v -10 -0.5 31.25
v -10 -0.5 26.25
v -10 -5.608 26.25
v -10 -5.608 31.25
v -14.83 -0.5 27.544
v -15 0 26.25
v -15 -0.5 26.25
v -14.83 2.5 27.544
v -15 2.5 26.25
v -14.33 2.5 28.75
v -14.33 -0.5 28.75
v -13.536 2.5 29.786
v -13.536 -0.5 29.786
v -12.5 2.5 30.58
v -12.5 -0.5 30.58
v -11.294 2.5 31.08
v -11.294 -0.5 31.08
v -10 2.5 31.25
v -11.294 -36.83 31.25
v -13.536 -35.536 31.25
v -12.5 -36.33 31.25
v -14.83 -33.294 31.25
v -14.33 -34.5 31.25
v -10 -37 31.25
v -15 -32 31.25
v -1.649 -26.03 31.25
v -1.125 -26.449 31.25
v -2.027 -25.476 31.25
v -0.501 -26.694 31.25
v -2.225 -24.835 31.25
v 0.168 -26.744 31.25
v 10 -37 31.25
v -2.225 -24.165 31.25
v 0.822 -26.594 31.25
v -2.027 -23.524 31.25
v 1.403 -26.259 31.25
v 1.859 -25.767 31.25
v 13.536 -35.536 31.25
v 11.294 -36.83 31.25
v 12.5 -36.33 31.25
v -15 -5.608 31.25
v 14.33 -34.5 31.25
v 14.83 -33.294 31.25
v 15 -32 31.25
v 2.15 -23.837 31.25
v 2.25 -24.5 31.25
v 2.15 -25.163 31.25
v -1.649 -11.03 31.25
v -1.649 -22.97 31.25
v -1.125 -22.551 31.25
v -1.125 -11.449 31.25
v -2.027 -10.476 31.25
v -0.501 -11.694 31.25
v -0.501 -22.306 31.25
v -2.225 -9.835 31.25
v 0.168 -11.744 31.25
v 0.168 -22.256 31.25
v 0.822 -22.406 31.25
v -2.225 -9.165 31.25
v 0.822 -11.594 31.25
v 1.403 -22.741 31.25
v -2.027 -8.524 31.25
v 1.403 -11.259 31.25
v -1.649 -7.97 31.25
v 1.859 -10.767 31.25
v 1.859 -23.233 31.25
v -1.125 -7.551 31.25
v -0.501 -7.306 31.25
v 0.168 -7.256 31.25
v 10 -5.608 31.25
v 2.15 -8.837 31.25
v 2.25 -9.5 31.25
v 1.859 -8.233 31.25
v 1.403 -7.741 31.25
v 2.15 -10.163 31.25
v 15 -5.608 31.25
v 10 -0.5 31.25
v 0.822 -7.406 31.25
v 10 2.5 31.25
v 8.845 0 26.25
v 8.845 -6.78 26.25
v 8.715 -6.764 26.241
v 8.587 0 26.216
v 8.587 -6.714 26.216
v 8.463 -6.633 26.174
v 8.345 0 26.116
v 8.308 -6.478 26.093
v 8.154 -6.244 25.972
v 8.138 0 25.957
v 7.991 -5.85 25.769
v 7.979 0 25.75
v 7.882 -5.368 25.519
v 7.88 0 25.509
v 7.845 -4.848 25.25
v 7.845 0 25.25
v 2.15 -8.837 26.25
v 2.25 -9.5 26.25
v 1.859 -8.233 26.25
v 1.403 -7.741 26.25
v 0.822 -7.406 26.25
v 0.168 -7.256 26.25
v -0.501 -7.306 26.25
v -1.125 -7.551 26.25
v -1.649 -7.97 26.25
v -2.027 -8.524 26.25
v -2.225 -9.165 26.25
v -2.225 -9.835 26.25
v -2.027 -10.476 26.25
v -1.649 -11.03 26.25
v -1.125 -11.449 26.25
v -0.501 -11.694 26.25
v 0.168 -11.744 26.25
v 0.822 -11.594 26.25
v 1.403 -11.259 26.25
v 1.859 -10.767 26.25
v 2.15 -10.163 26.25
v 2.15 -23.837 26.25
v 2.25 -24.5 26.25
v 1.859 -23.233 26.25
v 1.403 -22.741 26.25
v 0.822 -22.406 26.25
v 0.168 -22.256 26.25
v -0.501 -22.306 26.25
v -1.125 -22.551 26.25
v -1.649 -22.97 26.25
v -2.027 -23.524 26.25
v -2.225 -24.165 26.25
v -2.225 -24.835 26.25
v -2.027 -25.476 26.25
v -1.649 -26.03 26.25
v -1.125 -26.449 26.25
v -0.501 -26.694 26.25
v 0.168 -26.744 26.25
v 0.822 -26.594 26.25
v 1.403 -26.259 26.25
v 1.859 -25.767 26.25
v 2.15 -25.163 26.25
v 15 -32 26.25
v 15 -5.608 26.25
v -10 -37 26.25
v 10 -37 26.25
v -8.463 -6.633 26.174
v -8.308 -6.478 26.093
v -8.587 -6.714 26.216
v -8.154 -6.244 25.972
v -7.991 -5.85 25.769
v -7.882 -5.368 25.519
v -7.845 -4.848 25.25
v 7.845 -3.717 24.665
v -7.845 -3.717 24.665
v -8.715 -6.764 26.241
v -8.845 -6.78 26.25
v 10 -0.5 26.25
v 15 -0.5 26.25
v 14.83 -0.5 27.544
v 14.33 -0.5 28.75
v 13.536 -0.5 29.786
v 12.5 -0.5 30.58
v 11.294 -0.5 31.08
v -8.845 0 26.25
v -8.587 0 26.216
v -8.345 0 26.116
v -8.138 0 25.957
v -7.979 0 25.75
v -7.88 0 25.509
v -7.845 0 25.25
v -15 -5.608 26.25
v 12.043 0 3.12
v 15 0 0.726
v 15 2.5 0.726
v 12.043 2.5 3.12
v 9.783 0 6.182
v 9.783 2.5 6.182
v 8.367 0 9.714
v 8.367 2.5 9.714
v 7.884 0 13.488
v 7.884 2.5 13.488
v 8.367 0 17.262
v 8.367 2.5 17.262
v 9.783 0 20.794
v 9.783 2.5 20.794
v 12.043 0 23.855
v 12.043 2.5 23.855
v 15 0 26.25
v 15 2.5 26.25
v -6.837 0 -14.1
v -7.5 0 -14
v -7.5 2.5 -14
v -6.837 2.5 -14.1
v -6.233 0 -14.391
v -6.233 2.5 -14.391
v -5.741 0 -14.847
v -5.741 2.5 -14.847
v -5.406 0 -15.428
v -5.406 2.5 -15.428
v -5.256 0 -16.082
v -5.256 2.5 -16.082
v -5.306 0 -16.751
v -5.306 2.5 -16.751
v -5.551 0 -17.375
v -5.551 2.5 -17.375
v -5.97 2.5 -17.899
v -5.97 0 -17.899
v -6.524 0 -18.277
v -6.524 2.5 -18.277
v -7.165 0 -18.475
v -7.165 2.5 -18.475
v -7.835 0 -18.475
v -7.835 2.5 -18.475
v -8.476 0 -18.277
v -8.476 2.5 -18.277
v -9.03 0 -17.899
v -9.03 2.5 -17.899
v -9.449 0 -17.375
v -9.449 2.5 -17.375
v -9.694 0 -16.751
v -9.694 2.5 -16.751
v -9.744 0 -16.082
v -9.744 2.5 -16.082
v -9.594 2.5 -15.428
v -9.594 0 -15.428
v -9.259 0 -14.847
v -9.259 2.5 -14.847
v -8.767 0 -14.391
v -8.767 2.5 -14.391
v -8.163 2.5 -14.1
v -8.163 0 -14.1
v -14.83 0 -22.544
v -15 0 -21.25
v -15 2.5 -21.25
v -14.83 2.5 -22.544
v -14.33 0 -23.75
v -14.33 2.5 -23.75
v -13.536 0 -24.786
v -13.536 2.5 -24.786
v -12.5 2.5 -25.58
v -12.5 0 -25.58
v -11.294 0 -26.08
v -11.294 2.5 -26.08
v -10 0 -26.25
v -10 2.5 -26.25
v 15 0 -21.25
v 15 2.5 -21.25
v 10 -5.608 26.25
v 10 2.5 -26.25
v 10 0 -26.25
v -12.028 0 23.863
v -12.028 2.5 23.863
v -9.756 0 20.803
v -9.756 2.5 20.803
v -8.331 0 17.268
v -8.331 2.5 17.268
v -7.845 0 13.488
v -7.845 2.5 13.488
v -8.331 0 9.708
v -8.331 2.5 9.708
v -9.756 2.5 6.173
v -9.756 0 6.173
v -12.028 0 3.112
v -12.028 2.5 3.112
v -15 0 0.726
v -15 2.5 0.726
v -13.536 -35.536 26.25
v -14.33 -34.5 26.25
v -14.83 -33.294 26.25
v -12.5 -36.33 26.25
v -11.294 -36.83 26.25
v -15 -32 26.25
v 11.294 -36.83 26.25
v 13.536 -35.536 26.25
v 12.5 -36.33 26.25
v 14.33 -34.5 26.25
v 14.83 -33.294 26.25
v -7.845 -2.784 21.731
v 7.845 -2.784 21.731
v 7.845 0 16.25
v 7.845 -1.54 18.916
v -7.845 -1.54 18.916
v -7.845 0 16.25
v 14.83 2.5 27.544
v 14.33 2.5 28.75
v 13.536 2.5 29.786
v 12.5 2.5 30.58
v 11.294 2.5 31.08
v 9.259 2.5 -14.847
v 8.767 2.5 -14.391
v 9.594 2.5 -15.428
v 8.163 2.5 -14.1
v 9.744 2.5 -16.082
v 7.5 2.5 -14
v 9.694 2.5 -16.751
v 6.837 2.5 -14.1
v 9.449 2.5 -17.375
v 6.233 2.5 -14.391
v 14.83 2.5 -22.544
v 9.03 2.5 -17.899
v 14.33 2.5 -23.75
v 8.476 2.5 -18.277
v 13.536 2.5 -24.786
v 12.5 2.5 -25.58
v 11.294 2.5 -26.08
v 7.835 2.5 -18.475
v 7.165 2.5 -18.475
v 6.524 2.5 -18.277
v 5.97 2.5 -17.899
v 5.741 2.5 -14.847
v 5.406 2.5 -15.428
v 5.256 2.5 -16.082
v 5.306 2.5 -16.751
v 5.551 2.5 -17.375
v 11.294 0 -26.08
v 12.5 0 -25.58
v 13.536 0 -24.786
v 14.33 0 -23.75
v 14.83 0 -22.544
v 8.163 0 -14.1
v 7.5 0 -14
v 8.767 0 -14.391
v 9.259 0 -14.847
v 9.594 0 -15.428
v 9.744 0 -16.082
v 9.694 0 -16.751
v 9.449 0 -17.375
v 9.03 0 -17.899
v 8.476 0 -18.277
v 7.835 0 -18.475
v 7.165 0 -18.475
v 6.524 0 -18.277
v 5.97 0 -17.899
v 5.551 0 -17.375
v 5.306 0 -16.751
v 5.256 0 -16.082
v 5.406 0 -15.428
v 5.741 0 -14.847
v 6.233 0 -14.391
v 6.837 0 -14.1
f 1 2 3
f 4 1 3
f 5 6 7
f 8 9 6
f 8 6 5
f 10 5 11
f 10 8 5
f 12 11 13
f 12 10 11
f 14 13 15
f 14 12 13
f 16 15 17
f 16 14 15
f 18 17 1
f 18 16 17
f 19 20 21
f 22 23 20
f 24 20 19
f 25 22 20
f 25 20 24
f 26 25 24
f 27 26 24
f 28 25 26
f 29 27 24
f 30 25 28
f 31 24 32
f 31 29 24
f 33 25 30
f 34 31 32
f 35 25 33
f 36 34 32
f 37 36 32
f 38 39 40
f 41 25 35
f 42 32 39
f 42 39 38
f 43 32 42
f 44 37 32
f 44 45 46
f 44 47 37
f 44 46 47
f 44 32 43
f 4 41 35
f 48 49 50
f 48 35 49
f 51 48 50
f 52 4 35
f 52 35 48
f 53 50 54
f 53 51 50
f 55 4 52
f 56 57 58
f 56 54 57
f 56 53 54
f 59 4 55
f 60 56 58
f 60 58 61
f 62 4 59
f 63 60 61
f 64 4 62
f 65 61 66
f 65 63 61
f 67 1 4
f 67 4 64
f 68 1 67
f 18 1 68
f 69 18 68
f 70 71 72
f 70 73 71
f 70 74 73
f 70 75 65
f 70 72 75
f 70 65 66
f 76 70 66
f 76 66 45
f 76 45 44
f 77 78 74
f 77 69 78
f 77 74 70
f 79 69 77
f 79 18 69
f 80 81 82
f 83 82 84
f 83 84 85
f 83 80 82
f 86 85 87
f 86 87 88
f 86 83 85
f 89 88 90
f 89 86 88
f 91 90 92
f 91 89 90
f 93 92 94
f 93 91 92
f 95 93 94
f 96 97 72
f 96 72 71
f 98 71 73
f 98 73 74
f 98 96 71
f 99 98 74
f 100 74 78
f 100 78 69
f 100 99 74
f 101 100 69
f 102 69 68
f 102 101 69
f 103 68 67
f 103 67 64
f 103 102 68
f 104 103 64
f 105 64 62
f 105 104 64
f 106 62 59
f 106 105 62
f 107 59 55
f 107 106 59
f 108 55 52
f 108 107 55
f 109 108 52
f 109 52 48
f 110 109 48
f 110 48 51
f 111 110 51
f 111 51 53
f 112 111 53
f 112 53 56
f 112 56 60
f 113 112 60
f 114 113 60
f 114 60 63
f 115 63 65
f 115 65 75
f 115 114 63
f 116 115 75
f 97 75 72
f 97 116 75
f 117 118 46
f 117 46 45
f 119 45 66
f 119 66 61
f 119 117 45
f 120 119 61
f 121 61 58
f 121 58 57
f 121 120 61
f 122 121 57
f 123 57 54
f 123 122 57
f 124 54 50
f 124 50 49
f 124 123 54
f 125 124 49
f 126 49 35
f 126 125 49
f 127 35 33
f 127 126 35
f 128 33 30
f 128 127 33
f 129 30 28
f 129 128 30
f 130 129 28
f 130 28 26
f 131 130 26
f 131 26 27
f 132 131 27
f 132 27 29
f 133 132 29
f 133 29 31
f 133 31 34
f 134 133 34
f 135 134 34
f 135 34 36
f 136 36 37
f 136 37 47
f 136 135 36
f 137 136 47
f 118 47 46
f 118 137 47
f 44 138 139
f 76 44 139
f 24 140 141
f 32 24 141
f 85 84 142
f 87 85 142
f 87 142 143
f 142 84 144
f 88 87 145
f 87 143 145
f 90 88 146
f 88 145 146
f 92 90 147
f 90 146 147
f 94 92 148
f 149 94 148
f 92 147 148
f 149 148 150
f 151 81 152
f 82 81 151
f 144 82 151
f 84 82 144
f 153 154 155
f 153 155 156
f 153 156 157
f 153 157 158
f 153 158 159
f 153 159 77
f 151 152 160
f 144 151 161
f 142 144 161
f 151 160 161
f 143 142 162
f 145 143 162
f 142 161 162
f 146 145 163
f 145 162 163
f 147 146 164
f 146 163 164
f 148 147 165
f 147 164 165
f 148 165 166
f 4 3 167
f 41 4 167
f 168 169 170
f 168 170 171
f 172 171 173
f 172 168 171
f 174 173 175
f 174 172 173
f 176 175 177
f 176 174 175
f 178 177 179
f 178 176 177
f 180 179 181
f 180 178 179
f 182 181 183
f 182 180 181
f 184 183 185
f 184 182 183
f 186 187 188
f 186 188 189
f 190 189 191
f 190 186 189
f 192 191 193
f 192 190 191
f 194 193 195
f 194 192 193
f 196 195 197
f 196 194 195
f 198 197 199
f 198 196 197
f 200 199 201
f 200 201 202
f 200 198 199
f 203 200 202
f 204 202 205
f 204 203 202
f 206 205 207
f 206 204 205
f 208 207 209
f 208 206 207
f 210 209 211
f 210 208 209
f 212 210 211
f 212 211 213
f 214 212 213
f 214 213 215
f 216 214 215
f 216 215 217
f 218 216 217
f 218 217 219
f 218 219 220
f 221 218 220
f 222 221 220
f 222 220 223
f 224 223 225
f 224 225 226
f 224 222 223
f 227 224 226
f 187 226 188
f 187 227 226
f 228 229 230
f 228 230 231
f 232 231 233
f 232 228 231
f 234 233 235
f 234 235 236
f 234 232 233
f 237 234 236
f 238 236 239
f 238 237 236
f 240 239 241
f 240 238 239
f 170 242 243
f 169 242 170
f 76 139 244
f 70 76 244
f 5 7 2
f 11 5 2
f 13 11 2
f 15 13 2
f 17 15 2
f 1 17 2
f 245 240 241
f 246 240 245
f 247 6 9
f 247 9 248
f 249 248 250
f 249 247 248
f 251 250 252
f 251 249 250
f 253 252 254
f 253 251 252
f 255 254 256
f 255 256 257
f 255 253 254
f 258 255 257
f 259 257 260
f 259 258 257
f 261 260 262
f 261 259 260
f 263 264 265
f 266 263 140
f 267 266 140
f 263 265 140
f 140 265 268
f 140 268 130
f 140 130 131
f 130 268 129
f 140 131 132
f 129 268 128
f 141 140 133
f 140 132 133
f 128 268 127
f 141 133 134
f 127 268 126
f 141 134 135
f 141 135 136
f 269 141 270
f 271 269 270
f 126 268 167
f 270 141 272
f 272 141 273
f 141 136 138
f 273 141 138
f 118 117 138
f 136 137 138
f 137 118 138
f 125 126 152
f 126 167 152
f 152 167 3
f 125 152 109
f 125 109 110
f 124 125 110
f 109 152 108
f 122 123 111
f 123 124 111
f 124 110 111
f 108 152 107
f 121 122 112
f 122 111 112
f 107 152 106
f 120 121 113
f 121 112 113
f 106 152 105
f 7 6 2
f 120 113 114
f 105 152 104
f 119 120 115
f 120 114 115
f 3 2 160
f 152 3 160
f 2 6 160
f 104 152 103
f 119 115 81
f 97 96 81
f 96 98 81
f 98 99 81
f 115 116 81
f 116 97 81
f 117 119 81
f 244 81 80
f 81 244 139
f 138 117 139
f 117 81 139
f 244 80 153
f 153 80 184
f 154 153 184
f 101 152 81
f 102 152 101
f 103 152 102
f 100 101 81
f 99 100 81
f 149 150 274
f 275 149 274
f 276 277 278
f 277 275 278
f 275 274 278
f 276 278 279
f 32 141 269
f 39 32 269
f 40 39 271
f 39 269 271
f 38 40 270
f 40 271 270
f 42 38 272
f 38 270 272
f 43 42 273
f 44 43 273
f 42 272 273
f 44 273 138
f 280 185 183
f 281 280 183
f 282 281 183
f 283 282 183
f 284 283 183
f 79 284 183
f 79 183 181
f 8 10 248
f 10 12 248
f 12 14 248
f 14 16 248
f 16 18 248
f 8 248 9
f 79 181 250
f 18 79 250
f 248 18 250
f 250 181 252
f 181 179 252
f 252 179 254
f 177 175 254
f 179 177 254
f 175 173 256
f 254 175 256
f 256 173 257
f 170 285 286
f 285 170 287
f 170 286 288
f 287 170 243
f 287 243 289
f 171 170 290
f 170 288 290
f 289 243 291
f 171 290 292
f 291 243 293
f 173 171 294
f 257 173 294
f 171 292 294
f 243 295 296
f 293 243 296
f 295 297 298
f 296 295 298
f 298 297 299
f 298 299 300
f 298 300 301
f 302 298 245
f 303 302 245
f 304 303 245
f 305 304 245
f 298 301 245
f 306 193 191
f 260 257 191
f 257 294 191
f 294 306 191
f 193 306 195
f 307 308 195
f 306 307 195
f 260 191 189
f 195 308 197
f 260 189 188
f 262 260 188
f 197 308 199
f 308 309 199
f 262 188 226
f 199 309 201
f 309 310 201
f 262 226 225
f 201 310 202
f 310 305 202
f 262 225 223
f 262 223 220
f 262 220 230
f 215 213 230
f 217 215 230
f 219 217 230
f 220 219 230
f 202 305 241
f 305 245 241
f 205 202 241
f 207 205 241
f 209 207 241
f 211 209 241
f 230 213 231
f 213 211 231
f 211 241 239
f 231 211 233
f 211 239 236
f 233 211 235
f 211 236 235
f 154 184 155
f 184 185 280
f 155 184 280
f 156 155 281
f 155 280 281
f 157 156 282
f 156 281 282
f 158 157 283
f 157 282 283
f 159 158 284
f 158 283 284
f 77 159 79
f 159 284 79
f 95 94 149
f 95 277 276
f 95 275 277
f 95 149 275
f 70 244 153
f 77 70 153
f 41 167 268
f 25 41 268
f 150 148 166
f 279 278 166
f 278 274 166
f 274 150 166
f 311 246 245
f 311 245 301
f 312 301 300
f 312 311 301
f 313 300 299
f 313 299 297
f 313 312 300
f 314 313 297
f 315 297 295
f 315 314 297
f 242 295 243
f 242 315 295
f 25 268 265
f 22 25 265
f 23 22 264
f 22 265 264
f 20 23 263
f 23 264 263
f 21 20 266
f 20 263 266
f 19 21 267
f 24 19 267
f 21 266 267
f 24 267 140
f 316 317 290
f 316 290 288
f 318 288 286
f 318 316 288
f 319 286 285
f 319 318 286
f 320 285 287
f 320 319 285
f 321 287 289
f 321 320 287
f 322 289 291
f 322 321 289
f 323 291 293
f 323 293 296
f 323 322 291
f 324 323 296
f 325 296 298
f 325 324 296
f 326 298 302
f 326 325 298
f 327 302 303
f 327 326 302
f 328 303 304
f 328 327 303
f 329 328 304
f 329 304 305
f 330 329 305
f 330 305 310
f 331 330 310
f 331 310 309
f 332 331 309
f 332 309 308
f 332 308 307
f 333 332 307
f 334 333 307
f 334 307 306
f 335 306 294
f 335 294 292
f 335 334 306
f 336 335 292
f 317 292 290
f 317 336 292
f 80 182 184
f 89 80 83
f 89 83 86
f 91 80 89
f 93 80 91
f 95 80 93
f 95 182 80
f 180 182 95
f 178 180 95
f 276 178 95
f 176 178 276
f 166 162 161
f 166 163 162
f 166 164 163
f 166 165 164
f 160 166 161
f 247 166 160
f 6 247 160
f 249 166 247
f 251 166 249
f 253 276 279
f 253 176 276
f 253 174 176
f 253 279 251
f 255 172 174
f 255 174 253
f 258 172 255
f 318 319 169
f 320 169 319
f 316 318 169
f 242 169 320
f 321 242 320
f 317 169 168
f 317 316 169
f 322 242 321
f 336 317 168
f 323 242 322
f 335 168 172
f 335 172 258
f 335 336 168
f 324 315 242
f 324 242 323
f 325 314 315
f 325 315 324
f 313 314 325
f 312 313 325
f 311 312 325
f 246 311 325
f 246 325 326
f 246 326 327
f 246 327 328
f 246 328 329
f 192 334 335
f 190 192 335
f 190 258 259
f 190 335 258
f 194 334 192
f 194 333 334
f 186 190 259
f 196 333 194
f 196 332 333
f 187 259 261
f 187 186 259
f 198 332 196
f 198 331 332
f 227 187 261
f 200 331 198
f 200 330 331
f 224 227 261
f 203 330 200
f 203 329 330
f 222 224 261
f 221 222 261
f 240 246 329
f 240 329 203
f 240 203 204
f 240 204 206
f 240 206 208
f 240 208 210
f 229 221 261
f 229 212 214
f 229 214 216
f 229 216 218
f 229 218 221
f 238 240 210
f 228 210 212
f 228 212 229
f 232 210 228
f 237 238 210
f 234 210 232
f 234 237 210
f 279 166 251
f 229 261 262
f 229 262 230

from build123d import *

# Parameters (mm, degrees)
SKETCH1_R               = 2.25
BOSS_EXTRUDE1_DEPTH     = 2.5
SKETCH3_R               = 2.25
SKETCH3_W               = 20
SKETCH3_H               = 2.5
BOSS_EXTRUDE2_DEPTH     = 5
BOSS_EXTRUDE3_DEPTH     = 3
SKETCH5_W               = 15.690952434
SKETCH5_H               = 6.78006253
BOSS_EXTRUDE4_DEPTH     = 10
CUT_EXTRUDE1_DEPTH      = 54.54884017
CUT_EXTRUDE1_DEPTH_BACK = 54.54884017
FILLET3_R               = 1


with BuildPart() as part:
    # Sketch1 → Boss-Extrude1 (new body)
    with BuildSketch(Plane(origin=(0, 0, 0), x_dir=(1, 0, 0), z_dir=(0, 1, 0))):
        with BuildLine():
            Line((15, 21.25), (15, -0.725838237))
            ThreePointArc((15, -0.725838237), (7.884185652, -13.487919119), (15, -26.25))
            Line((15, -26.25), (-15, -26.25))
            ThreePointArc((-15, -26.25), (-7.845476217, -13.487919119), (-15, -0.725838237))
            Line((-15, -0.725838237), (-15, 21.25))
            ThreePointArc((-15, 21.25), (-13.535533906, 24.785533906), (-10, 26.25))
            Line((-10, 26.25), (10, 26.25))
            ThreePointArc((10, 26.25), (13.535533906, 24.785533906), (15, 21.25))
        make_face()
        with Locations(Location((-7.5, 16.25, 0), (0, 0, 270))):
            Circle(SKETCH1_R, mode=Mode.SUBTRACT)
        with Locations(Location((7.5, 16.25, 0), (0, 0, 270))):
            Circle(SKETCH1_R, mode=Mode.SUBTRACT)
    extrude(amount=BOSS_EXTRUDE1_DEPTH)

    # Sketch3 → Boss-Extrude2 (add)
    # profile 1 of 2: a face of its own
    with BuildSketch(Plane.XY.offset(26.25)):
        with BuildLine():
            Line((10, 0), (-10, 0))
            Line((-10, 0), (-10, -5.607597834))
            Line((-10, -5.607597834), (-15, -5.607597834))
            Line((-15, -5.607597834), (-15, -32))
            ThreePointArc((-15, -32), (-13.535533906, -35.535533906), (-10, -37))
            Line((-10, -37), (10, -37))
            ThreePointArc((10, -37), (13.535533906, -35.535533906), (15, -32))
            Line((15, -32), (15, -5.607597834))
            Line((15, -5.607597834), (10, -5.607597834))
            Line((10, -5.607597834), (10, 0))
        make_face()
        with Locations((0, -24.5)):
            Circle(SKETCH3_R, mode=Mode.SUBTRACT)
        with Locations((0, -9.5)):
            Circle(SKETCH3_R, mode=Mode.SUBTRACT)
    # profile 2 of 2: a face of its own
    with BuildSketch(Plane.XY.offset(26.25)):
        with Locations((0, 1.25)):
            Rectangle(SKETCH3_W, SKETCH3_H)
    extrude(amount=BOSS_EXTRUDE2_DEPTH)

    # Sketch4 → Boss-Extrude3 (add)
    with BuildSketch(Plane(origin=(0, 2.5, 0), x_dir=(1, 0, 0), z_dir=(0, 1, 0))):
        with BuildLine():
            Line((10, -31.25), (10, -26.25))
            Line((10, -26.25), (15, -26.25))
            ThreePointArc((15, -26.25), (13.535533906, -29.785533906), (10, -31.25))
        make_face()
        with BuildLine():
            Line((-10, -31.25), (-10, -26.25))
            Line((-10, -26.25), (-15, -26.25))
            ThreePointArc((-15, -26.25), (-13.535533906, -29.785533906), (-10, -31.25))
        make_face()
    extrude(amount=-BOSS_EXTRUDE3_DEPTH)

    # Sketch5 → Boss-Extrude4 (add)
    with BuildSketch(Plane(origin=(0, 0, 26.25), x_dir=(-1, 0, 0), z_dir=(0, 0, -1))):
        with Locations((0, -3.390031265)):
            Rectangle(SKETCH5_W, SKETCH5_H)
    extrude(amount=BOSS_EXTRUDE4_DEPTH)

    # Sketch6 → Cut-Extrude1 (cut, two sides: drawn at the far end of the back side and taken through both)
    with BuildSketch(Plane(origin=(7.845476217, 0, 0), x_dir=(0, 0, -1), z_dir=(1, 0, 0)).offset(-CUT_EXTRUDE1_DEPTH_BACK)):
        with BuildLine():
            Line((-26.25, -6.78006253), (-24.66461888, -3.717189072))
            ThreePointArc((-24.66461888, -3.717189072), (-20.306619121, -2.19971294), (-16.25, 0))
            Line((-16.25, 0), (-16.25, -6.78006253))
            Line((-16.25, -6.78006253), (-26.25, -6.78006253))
        make_face()
    extrude(amount=CUT_EXTRUDE1_DEPTH + CUT_EXTRUDE1_DEPTH_BACK, mode=Mode.SUBTRACT)

    # Fillet3
    fillet3_edges = [part.edges().sort_by_distance(p)[0] for p in [
        (-7.845476217, -3.390031265, 26.25),
        (7.845476217, -3.390031265, 26.25),
    ]]
    fillet(fillet3_edges, radius=FILLET3_R)


solid = part.part
